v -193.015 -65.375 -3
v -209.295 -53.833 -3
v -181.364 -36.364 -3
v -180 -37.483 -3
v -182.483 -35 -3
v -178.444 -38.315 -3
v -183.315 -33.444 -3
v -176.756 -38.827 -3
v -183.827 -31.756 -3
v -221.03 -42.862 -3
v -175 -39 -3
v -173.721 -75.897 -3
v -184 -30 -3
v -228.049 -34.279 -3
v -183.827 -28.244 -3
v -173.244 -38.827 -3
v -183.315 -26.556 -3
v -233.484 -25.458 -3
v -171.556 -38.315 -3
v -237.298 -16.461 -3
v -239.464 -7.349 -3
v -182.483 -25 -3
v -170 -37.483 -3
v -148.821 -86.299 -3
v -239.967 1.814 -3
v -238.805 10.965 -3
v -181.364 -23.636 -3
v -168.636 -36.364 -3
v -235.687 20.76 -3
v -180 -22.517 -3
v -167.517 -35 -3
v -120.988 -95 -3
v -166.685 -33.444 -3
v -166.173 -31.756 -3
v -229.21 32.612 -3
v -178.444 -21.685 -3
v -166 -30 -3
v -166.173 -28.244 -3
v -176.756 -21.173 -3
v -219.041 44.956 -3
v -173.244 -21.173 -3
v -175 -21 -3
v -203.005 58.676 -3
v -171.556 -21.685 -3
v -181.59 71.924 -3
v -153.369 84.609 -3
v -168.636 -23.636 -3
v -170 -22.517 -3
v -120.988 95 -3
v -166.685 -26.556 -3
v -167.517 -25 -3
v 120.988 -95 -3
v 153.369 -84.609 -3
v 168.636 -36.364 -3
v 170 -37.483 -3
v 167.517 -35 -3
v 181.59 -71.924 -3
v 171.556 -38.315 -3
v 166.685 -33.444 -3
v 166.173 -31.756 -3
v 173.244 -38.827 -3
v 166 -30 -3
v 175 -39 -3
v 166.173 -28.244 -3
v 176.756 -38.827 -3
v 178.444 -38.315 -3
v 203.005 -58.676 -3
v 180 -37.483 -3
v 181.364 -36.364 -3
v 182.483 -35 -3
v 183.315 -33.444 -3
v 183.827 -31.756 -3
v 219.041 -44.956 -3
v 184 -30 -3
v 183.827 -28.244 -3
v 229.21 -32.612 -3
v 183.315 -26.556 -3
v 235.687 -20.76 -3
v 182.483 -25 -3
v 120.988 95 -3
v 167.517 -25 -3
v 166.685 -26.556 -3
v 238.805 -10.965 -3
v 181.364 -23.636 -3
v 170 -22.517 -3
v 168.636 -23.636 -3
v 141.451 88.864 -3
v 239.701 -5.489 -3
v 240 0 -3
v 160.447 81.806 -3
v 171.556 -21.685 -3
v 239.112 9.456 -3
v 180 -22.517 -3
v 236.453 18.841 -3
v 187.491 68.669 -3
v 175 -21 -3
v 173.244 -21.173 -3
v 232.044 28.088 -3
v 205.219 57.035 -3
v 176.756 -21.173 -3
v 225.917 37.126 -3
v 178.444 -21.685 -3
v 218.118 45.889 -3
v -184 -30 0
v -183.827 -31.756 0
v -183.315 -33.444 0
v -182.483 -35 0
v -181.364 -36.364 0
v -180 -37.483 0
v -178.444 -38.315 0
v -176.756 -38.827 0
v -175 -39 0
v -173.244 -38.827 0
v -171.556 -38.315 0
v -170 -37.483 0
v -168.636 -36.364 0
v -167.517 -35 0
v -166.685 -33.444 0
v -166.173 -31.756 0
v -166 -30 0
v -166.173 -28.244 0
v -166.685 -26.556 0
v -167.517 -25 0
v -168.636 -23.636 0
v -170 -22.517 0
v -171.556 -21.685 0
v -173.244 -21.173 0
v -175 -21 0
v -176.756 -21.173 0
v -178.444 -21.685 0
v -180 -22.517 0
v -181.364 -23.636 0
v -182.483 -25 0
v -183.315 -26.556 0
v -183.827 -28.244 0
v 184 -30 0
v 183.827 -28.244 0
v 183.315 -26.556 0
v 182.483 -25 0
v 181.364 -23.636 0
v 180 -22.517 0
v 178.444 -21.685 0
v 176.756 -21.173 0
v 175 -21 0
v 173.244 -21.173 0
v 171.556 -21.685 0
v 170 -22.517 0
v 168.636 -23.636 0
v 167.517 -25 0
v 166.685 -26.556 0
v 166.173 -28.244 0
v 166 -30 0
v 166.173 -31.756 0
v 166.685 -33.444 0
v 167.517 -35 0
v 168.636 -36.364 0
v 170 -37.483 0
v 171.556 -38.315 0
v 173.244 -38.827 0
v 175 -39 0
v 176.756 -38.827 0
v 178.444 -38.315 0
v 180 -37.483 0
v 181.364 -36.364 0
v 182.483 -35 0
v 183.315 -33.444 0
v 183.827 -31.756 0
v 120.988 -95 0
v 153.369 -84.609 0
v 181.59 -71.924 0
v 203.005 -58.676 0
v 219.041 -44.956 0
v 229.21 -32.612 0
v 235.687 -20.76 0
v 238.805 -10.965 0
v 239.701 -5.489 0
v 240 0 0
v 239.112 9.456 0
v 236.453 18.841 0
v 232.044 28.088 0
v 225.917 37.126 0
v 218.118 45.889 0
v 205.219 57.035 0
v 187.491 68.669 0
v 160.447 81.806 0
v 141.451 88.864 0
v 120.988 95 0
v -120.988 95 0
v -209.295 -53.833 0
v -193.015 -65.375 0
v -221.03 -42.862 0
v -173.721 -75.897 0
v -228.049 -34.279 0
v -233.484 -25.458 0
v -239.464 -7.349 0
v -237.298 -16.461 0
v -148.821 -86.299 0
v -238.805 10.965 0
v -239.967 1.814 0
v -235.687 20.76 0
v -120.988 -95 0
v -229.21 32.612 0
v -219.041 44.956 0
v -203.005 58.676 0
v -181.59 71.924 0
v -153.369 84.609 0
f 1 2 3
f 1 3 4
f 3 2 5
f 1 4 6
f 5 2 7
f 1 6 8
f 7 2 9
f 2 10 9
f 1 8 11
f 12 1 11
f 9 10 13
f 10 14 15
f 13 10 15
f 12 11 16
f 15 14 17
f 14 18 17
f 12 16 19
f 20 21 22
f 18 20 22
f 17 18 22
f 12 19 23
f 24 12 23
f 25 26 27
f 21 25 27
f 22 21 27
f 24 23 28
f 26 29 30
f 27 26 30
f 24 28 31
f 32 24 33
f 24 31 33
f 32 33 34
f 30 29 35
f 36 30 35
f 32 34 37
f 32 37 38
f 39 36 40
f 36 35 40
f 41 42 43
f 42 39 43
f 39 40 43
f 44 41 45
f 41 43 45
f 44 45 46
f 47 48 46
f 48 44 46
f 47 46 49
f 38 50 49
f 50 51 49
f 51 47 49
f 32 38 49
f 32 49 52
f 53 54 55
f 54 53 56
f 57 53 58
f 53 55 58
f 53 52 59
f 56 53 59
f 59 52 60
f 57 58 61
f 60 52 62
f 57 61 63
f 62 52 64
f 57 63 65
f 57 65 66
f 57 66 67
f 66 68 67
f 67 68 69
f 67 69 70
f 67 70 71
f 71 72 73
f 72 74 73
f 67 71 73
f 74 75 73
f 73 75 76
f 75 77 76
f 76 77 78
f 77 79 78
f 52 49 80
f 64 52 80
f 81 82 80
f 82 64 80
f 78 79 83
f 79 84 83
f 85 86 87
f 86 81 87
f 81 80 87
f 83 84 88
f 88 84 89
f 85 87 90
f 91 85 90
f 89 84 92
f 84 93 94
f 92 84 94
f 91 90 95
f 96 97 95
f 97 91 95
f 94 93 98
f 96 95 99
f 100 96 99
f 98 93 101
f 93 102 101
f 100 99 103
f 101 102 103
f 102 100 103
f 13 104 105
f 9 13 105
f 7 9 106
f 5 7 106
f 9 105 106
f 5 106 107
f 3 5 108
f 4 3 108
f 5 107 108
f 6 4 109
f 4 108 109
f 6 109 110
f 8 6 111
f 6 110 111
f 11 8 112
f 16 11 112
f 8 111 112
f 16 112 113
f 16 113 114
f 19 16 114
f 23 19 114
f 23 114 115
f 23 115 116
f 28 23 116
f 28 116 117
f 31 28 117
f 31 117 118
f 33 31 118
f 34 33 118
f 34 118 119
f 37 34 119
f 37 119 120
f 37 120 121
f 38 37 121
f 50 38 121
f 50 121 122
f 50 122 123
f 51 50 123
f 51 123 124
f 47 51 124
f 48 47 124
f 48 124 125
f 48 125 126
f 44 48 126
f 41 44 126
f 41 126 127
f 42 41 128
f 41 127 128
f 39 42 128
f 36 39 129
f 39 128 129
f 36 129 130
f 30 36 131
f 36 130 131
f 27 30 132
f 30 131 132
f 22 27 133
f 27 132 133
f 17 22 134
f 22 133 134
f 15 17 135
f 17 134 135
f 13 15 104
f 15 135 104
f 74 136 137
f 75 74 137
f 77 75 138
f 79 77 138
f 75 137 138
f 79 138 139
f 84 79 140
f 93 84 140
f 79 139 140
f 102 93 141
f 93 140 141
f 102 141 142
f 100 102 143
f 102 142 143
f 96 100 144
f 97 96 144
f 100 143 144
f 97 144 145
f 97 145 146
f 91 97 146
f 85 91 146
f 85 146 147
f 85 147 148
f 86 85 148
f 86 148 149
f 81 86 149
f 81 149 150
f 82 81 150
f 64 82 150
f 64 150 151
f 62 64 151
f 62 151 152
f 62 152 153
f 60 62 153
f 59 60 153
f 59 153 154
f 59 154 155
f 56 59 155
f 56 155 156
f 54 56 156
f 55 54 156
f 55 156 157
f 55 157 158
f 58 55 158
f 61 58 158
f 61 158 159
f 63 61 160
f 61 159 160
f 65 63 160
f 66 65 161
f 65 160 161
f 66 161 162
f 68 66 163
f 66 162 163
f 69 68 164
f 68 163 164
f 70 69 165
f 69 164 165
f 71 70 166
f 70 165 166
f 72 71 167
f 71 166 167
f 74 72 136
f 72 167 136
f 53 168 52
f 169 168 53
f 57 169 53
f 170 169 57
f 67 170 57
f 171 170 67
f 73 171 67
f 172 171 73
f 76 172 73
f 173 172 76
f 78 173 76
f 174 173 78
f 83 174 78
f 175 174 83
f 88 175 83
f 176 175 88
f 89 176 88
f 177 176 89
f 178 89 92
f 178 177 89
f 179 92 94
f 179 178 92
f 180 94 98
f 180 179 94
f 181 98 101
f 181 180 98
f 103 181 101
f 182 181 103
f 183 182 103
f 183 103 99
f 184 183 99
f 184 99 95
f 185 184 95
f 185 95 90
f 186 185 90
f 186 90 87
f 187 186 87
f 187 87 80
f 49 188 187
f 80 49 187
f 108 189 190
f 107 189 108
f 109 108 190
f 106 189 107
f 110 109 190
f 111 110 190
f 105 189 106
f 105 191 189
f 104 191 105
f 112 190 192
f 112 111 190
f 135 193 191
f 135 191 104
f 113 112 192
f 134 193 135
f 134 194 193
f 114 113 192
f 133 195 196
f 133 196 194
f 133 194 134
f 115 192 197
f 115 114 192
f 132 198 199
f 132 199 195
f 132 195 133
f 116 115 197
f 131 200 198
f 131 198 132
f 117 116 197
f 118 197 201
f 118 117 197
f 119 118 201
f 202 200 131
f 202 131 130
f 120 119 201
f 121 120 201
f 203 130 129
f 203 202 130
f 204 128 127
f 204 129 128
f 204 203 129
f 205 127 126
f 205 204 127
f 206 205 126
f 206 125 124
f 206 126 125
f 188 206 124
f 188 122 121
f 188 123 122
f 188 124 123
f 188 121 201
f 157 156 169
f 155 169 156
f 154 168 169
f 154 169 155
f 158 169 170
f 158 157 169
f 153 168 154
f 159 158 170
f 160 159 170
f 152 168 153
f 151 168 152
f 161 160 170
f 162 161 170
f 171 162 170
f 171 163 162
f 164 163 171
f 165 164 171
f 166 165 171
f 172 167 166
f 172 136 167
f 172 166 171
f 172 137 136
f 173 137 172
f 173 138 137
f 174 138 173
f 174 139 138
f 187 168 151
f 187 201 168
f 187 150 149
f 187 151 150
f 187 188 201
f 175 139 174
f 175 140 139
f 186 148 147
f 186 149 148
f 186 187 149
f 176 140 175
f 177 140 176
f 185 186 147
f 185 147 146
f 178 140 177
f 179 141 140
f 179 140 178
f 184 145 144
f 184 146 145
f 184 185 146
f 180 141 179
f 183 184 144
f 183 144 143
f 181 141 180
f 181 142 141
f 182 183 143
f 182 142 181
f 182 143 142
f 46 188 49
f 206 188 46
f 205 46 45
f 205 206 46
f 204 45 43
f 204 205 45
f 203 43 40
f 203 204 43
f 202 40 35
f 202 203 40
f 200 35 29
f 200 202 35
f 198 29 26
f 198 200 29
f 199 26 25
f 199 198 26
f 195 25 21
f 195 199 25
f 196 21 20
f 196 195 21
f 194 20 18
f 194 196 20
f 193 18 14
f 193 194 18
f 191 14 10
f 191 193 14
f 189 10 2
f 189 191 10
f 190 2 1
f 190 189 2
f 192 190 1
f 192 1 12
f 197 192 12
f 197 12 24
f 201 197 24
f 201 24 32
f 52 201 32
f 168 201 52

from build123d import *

# Parameters (mm, degrees)
SKETCH1_RX          = 240
SKETCH1_RY          = 110
BOSS_EXTRUDE1_DEPTH = 3
SKETCH12_R          = 9
CUT_EXTRUDE8_DEPTH  = 265.024620064
SKETCH13_W          = 480
SKETCH13_H          = 15
CUT_EXTRUDE9_DEPTH  = 265.024620064


with BuildPart() as part:
    # Sketch1 → Boss-Extrude1 (new body)
    with BuildSketch(Plane.XY):
        with Locations((0, 0)):
            Ellipse(SKETCH1_RX, SKETCH1_RY)
    extrude(amount=-BOSS_EXTRUDE1_DEPTH)

    # Sketch12 → Cut-Extrude8 (cut, through all)
    with BuildSketch(Plane.XY):
        with Locations((175, -30)):
            Circle(SKETCH12_R)
        with Locations(Location((-175, -30, 0), (0, 0, 180))):
            Circle(SKETCH12_R)
    extrude(amount=-CUT_EXTRUDE8_DEPTH, mode=Mode.SUBTRACT)

    # Sketch13 → Cut-Extrude9 (cut, through all)
    with BuildSketch(Plane.XY):
        with Locations((0, -102.5)):
            Rectangle(SKETCH13_W, SKETCH13_H)
        with Locations((0, 102.5)):
            Rectangle(SKETCH13_W, SKETCH13_H)
    extrude(amount=-CUT_EXTRUDE9_DEPTH, mode=Mode.SUBTRACT)


solid = part.part
